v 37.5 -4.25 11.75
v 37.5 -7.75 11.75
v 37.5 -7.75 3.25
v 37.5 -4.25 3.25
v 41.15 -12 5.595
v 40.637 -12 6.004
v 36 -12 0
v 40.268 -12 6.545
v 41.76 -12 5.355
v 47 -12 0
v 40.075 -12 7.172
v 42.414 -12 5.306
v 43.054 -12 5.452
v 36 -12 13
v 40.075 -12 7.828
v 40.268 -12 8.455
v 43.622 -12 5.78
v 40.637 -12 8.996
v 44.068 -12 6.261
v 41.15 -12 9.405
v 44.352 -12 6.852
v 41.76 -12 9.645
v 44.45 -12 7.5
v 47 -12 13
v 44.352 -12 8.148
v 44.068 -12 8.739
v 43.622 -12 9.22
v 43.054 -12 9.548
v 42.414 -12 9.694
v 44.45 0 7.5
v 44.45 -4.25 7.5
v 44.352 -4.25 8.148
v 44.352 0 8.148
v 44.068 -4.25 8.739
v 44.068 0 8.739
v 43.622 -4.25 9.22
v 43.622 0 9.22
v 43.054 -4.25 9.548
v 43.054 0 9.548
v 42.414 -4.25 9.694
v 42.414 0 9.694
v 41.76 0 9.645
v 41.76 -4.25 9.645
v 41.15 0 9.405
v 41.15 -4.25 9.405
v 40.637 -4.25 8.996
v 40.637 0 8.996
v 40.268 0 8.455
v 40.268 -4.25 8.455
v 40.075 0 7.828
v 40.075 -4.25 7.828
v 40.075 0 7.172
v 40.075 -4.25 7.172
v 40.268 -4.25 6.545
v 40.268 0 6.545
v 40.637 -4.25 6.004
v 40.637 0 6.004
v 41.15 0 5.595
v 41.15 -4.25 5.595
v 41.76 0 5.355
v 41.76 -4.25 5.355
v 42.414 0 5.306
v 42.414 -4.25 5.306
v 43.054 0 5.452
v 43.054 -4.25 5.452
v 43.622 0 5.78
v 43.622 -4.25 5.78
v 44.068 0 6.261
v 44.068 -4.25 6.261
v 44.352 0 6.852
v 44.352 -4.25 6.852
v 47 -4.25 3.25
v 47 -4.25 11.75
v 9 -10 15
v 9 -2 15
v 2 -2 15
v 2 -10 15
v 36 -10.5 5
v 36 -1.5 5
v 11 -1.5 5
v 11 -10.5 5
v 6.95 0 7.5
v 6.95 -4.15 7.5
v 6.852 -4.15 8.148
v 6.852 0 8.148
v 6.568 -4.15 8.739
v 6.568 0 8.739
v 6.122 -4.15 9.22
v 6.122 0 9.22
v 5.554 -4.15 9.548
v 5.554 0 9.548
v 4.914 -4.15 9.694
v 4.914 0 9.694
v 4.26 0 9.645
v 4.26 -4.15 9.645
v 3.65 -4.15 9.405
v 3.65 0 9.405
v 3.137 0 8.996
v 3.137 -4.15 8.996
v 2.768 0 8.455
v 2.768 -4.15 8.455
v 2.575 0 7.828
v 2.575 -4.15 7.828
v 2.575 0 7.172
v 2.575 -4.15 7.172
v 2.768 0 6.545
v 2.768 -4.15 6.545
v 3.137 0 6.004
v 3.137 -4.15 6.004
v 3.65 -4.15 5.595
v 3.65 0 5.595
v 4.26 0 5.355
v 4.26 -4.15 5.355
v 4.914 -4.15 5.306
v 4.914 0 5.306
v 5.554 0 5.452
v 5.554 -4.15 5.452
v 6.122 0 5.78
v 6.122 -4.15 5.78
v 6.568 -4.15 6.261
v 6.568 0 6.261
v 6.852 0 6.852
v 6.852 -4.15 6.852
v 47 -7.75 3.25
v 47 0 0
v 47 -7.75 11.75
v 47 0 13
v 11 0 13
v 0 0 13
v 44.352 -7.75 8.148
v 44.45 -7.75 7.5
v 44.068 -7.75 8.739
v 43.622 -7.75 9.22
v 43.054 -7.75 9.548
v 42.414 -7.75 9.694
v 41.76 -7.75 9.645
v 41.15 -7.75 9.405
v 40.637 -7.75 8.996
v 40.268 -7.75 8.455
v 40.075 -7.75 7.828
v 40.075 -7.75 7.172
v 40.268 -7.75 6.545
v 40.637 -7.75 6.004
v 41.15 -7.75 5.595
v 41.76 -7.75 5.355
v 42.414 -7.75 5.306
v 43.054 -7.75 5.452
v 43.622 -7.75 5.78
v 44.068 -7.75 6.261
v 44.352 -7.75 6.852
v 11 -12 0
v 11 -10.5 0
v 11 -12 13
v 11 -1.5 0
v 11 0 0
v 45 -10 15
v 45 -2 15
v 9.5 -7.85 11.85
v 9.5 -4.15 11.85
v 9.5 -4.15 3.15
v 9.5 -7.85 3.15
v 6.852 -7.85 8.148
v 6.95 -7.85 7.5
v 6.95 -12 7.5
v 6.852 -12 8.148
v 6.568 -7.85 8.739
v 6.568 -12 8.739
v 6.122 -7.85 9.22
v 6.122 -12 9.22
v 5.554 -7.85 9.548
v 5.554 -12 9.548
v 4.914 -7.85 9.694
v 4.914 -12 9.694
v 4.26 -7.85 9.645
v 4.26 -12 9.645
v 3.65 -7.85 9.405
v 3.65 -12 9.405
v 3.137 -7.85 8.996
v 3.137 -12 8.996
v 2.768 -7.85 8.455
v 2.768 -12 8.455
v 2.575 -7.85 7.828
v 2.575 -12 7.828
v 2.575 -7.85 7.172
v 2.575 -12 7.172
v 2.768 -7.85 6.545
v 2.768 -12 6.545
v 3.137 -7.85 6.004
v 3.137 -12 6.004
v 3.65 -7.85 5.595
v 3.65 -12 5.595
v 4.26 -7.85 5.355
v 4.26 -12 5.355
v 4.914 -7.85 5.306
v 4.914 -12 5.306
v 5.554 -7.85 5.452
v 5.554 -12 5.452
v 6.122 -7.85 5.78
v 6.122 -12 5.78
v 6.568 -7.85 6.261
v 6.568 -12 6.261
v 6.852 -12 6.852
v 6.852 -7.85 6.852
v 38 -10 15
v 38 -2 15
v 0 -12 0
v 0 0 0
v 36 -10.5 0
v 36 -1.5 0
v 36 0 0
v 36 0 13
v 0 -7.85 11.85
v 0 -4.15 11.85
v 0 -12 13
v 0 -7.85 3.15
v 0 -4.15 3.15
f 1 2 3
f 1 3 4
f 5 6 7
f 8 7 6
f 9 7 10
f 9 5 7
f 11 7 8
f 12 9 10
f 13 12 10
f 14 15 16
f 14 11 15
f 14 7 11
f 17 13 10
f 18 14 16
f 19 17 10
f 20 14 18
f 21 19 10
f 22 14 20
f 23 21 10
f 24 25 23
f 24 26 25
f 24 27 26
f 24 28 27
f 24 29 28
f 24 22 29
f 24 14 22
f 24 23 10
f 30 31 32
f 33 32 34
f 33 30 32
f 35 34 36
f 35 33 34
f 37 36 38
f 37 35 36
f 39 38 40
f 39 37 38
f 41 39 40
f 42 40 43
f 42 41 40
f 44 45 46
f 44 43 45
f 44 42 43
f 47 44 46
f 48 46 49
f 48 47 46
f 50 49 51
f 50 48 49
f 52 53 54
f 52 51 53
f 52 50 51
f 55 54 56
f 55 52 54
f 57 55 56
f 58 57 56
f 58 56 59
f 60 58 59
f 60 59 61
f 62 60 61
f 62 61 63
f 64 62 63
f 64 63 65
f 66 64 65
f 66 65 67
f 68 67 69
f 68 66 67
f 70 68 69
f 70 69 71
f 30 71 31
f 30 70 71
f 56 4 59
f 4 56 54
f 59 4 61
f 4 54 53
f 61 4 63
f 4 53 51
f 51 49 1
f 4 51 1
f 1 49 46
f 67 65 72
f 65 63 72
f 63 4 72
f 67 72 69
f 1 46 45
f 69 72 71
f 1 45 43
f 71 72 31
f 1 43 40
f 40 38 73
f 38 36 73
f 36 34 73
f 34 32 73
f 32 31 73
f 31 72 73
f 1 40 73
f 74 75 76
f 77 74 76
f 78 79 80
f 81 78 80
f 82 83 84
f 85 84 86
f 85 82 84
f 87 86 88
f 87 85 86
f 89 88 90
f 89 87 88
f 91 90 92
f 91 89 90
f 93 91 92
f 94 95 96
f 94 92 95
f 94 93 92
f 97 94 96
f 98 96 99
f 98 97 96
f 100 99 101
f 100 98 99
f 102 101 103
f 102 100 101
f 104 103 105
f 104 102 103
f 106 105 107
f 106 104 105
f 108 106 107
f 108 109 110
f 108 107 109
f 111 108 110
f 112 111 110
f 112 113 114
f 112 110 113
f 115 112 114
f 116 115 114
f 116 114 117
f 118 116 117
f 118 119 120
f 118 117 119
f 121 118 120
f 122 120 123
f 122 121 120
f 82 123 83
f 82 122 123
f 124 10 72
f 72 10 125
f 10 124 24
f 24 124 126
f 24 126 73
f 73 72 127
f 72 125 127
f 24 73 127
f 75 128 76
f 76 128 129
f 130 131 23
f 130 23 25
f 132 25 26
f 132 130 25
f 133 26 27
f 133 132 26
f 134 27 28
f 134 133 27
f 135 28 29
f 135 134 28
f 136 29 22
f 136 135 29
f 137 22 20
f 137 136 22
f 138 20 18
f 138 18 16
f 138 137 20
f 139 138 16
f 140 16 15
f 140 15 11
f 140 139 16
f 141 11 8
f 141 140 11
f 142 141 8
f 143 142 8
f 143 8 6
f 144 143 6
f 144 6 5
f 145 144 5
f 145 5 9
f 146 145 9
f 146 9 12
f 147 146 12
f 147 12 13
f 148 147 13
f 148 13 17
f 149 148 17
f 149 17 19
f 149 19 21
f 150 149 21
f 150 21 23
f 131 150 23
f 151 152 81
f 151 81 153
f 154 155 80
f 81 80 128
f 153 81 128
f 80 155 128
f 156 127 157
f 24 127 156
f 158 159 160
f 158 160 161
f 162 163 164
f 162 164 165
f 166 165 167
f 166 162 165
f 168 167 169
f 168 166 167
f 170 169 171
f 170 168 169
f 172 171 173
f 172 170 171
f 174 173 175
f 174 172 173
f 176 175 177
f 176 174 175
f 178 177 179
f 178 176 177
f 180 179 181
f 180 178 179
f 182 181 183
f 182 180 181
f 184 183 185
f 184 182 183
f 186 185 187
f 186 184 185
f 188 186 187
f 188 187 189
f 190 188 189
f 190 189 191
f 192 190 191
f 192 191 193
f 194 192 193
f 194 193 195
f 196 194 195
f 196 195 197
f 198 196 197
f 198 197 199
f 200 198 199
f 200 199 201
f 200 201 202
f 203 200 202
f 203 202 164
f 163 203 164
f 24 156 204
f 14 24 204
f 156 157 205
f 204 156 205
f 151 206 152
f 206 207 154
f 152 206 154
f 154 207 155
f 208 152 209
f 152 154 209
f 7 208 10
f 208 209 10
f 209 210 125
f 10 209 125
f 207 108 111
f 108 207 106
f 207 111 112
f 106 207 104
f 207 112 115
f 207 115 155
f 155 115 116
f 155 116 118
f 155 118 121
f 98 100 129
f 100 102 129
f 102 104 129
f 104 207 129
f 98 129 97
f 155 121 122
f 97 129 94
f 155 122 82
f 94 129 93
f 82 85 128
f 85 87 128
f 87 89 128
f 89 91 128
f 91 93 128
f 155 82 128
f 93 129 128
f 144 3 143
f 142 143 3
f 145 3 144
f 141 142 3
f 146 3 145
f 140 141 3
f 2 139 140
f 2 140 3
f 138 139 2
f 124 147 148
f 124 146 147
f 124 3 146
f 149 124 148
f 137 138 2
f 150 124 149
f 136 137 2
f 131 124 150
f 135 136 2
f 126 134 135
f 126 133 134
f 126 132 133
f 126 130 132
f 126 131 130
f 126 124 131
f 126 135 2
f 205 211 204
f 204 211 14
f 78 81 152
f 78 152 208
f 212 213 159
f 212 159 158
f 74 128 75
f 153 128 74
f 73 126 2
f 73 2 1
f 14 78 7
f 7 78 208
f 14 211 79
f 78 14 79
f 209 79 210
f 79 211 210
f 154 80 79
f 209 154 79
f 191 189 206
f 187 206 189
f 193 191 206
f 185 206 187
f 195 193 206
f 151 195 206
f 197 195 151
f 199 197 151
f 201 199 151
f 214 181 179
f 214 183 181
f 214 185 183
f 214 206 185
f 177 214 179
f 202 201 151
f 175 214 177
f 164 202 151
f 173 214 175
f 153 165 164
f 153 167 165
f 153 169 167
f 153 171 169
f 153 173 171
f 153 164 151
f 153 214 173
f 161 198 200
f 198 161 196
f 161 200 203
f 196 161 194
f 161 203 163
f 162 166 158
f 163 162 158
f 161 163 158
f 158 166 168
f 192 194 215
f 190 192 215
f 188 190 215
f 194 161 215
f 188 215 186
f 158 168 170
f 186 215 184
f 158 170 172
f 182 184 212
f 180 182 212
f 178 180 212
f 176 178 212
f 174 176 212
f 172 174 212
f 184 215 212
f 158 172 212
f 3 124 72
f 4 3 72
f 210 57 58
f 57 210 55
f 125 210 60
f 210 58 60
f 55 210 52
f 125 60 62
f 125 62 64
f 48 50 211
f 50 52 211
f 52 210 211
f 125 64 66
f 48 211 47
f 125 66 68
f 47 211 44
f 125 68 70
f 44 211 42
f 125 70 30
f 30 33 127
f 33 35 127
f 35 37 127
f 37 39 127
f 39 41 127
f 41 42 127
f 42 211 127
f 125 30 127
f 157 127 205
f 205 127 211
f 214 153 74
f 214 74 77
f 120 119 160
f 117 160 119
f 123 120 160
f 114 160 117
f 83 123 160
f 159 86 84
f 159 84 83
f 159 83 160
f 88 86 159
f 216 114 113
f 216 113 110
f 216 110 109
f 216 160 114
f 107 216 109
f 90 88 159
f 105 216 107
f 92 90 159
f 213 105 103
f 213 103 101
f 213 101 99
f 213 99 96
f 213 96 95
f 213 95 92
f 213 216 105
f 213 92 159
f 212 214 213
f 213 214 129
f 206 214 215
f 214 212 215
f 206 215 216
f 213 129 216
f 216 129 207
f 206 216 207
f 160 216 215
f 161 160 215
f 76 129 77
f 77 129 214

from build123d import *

# Parameters (mm, degrees)
F0_R     = 2.2
F1_DEPTH = 12
F2_W     = 3.5
F2_H     = 8.5
F3_DEPTH = 9.5
F4_W     = 3.7
F4_H     = 8.7
F5_DEPTH = 9.5
F6_W     = 25
F6_H     = 1.5
F7_DEPTH = 5.001
F8_SIZE  = 2


with BuildPart() as f1:
    # F0 (on Front) → F1 (new body)
    with BuildSketch(Plane.XZ):
        Polygon((11, 15), (0, 15), (0, 0), (47, 0), (47, 15), (36, 15), (36, 5), (11, 5), align=None)
        with Locations((4.75, 7.5)):
            Circle(F0_R, mode=Mode.SUBTRACT)
        with Locations((42.25, 7.5)):
            Circle(F0_R, mode=Mode.SUBTRACT)
    extrude(amount=F1_DEPTH)

    # F2 (on face) → F3 (cut)
    with BuildSketch(Plane.YZ.offset(47)):
        with Locations((-6, 7.5)):
            Rectangle(F2_W, F2_H)
    extrude(amount=-F3_DEPTH, mode=Mode.SUBTRACT)

    # F4 (on face) → F5 (cut)
    with BuildSketch(Plane(origin=(0, 0, 0), x_dir=(0, -1, 0), z_dir=(-1, 0, 0))):
        with Locations((6, 7.5)):
            Rectangle(F4_W, F4_H)
    extrude(amount=-F5_DEPTH, mode=Mode.SUBTRACT)

    # F6 (on face) → F7 (cut, through all)
    with BuildSketch(Plane.XY.offset(5)):
        with Locations((23.5, -0.75)):
            Rectangle(F6_W, F6_H)
        with Locations((23.5, -11.25)):
            Rectangle(F6_W, F6_H)
    extrude(amount=-F7_DEPTH, mode=Mode.SUBTRACT)

    # F8
    f8_edges = [f1.edges().sort_by_distance(p)[0] for p in [
        (11, -6, 15),
        (0, -6, 15),
        (5.5, 0, 15),
        (5.5, -12, 15),
        (47, -6, 15),
        (36, -6, 15),
        (41.5, 0, 15),
        (41.5, -12, 15),
    ]]
    chamfer(f8_edges, length=F8_SIZE)


solid = f1.part
